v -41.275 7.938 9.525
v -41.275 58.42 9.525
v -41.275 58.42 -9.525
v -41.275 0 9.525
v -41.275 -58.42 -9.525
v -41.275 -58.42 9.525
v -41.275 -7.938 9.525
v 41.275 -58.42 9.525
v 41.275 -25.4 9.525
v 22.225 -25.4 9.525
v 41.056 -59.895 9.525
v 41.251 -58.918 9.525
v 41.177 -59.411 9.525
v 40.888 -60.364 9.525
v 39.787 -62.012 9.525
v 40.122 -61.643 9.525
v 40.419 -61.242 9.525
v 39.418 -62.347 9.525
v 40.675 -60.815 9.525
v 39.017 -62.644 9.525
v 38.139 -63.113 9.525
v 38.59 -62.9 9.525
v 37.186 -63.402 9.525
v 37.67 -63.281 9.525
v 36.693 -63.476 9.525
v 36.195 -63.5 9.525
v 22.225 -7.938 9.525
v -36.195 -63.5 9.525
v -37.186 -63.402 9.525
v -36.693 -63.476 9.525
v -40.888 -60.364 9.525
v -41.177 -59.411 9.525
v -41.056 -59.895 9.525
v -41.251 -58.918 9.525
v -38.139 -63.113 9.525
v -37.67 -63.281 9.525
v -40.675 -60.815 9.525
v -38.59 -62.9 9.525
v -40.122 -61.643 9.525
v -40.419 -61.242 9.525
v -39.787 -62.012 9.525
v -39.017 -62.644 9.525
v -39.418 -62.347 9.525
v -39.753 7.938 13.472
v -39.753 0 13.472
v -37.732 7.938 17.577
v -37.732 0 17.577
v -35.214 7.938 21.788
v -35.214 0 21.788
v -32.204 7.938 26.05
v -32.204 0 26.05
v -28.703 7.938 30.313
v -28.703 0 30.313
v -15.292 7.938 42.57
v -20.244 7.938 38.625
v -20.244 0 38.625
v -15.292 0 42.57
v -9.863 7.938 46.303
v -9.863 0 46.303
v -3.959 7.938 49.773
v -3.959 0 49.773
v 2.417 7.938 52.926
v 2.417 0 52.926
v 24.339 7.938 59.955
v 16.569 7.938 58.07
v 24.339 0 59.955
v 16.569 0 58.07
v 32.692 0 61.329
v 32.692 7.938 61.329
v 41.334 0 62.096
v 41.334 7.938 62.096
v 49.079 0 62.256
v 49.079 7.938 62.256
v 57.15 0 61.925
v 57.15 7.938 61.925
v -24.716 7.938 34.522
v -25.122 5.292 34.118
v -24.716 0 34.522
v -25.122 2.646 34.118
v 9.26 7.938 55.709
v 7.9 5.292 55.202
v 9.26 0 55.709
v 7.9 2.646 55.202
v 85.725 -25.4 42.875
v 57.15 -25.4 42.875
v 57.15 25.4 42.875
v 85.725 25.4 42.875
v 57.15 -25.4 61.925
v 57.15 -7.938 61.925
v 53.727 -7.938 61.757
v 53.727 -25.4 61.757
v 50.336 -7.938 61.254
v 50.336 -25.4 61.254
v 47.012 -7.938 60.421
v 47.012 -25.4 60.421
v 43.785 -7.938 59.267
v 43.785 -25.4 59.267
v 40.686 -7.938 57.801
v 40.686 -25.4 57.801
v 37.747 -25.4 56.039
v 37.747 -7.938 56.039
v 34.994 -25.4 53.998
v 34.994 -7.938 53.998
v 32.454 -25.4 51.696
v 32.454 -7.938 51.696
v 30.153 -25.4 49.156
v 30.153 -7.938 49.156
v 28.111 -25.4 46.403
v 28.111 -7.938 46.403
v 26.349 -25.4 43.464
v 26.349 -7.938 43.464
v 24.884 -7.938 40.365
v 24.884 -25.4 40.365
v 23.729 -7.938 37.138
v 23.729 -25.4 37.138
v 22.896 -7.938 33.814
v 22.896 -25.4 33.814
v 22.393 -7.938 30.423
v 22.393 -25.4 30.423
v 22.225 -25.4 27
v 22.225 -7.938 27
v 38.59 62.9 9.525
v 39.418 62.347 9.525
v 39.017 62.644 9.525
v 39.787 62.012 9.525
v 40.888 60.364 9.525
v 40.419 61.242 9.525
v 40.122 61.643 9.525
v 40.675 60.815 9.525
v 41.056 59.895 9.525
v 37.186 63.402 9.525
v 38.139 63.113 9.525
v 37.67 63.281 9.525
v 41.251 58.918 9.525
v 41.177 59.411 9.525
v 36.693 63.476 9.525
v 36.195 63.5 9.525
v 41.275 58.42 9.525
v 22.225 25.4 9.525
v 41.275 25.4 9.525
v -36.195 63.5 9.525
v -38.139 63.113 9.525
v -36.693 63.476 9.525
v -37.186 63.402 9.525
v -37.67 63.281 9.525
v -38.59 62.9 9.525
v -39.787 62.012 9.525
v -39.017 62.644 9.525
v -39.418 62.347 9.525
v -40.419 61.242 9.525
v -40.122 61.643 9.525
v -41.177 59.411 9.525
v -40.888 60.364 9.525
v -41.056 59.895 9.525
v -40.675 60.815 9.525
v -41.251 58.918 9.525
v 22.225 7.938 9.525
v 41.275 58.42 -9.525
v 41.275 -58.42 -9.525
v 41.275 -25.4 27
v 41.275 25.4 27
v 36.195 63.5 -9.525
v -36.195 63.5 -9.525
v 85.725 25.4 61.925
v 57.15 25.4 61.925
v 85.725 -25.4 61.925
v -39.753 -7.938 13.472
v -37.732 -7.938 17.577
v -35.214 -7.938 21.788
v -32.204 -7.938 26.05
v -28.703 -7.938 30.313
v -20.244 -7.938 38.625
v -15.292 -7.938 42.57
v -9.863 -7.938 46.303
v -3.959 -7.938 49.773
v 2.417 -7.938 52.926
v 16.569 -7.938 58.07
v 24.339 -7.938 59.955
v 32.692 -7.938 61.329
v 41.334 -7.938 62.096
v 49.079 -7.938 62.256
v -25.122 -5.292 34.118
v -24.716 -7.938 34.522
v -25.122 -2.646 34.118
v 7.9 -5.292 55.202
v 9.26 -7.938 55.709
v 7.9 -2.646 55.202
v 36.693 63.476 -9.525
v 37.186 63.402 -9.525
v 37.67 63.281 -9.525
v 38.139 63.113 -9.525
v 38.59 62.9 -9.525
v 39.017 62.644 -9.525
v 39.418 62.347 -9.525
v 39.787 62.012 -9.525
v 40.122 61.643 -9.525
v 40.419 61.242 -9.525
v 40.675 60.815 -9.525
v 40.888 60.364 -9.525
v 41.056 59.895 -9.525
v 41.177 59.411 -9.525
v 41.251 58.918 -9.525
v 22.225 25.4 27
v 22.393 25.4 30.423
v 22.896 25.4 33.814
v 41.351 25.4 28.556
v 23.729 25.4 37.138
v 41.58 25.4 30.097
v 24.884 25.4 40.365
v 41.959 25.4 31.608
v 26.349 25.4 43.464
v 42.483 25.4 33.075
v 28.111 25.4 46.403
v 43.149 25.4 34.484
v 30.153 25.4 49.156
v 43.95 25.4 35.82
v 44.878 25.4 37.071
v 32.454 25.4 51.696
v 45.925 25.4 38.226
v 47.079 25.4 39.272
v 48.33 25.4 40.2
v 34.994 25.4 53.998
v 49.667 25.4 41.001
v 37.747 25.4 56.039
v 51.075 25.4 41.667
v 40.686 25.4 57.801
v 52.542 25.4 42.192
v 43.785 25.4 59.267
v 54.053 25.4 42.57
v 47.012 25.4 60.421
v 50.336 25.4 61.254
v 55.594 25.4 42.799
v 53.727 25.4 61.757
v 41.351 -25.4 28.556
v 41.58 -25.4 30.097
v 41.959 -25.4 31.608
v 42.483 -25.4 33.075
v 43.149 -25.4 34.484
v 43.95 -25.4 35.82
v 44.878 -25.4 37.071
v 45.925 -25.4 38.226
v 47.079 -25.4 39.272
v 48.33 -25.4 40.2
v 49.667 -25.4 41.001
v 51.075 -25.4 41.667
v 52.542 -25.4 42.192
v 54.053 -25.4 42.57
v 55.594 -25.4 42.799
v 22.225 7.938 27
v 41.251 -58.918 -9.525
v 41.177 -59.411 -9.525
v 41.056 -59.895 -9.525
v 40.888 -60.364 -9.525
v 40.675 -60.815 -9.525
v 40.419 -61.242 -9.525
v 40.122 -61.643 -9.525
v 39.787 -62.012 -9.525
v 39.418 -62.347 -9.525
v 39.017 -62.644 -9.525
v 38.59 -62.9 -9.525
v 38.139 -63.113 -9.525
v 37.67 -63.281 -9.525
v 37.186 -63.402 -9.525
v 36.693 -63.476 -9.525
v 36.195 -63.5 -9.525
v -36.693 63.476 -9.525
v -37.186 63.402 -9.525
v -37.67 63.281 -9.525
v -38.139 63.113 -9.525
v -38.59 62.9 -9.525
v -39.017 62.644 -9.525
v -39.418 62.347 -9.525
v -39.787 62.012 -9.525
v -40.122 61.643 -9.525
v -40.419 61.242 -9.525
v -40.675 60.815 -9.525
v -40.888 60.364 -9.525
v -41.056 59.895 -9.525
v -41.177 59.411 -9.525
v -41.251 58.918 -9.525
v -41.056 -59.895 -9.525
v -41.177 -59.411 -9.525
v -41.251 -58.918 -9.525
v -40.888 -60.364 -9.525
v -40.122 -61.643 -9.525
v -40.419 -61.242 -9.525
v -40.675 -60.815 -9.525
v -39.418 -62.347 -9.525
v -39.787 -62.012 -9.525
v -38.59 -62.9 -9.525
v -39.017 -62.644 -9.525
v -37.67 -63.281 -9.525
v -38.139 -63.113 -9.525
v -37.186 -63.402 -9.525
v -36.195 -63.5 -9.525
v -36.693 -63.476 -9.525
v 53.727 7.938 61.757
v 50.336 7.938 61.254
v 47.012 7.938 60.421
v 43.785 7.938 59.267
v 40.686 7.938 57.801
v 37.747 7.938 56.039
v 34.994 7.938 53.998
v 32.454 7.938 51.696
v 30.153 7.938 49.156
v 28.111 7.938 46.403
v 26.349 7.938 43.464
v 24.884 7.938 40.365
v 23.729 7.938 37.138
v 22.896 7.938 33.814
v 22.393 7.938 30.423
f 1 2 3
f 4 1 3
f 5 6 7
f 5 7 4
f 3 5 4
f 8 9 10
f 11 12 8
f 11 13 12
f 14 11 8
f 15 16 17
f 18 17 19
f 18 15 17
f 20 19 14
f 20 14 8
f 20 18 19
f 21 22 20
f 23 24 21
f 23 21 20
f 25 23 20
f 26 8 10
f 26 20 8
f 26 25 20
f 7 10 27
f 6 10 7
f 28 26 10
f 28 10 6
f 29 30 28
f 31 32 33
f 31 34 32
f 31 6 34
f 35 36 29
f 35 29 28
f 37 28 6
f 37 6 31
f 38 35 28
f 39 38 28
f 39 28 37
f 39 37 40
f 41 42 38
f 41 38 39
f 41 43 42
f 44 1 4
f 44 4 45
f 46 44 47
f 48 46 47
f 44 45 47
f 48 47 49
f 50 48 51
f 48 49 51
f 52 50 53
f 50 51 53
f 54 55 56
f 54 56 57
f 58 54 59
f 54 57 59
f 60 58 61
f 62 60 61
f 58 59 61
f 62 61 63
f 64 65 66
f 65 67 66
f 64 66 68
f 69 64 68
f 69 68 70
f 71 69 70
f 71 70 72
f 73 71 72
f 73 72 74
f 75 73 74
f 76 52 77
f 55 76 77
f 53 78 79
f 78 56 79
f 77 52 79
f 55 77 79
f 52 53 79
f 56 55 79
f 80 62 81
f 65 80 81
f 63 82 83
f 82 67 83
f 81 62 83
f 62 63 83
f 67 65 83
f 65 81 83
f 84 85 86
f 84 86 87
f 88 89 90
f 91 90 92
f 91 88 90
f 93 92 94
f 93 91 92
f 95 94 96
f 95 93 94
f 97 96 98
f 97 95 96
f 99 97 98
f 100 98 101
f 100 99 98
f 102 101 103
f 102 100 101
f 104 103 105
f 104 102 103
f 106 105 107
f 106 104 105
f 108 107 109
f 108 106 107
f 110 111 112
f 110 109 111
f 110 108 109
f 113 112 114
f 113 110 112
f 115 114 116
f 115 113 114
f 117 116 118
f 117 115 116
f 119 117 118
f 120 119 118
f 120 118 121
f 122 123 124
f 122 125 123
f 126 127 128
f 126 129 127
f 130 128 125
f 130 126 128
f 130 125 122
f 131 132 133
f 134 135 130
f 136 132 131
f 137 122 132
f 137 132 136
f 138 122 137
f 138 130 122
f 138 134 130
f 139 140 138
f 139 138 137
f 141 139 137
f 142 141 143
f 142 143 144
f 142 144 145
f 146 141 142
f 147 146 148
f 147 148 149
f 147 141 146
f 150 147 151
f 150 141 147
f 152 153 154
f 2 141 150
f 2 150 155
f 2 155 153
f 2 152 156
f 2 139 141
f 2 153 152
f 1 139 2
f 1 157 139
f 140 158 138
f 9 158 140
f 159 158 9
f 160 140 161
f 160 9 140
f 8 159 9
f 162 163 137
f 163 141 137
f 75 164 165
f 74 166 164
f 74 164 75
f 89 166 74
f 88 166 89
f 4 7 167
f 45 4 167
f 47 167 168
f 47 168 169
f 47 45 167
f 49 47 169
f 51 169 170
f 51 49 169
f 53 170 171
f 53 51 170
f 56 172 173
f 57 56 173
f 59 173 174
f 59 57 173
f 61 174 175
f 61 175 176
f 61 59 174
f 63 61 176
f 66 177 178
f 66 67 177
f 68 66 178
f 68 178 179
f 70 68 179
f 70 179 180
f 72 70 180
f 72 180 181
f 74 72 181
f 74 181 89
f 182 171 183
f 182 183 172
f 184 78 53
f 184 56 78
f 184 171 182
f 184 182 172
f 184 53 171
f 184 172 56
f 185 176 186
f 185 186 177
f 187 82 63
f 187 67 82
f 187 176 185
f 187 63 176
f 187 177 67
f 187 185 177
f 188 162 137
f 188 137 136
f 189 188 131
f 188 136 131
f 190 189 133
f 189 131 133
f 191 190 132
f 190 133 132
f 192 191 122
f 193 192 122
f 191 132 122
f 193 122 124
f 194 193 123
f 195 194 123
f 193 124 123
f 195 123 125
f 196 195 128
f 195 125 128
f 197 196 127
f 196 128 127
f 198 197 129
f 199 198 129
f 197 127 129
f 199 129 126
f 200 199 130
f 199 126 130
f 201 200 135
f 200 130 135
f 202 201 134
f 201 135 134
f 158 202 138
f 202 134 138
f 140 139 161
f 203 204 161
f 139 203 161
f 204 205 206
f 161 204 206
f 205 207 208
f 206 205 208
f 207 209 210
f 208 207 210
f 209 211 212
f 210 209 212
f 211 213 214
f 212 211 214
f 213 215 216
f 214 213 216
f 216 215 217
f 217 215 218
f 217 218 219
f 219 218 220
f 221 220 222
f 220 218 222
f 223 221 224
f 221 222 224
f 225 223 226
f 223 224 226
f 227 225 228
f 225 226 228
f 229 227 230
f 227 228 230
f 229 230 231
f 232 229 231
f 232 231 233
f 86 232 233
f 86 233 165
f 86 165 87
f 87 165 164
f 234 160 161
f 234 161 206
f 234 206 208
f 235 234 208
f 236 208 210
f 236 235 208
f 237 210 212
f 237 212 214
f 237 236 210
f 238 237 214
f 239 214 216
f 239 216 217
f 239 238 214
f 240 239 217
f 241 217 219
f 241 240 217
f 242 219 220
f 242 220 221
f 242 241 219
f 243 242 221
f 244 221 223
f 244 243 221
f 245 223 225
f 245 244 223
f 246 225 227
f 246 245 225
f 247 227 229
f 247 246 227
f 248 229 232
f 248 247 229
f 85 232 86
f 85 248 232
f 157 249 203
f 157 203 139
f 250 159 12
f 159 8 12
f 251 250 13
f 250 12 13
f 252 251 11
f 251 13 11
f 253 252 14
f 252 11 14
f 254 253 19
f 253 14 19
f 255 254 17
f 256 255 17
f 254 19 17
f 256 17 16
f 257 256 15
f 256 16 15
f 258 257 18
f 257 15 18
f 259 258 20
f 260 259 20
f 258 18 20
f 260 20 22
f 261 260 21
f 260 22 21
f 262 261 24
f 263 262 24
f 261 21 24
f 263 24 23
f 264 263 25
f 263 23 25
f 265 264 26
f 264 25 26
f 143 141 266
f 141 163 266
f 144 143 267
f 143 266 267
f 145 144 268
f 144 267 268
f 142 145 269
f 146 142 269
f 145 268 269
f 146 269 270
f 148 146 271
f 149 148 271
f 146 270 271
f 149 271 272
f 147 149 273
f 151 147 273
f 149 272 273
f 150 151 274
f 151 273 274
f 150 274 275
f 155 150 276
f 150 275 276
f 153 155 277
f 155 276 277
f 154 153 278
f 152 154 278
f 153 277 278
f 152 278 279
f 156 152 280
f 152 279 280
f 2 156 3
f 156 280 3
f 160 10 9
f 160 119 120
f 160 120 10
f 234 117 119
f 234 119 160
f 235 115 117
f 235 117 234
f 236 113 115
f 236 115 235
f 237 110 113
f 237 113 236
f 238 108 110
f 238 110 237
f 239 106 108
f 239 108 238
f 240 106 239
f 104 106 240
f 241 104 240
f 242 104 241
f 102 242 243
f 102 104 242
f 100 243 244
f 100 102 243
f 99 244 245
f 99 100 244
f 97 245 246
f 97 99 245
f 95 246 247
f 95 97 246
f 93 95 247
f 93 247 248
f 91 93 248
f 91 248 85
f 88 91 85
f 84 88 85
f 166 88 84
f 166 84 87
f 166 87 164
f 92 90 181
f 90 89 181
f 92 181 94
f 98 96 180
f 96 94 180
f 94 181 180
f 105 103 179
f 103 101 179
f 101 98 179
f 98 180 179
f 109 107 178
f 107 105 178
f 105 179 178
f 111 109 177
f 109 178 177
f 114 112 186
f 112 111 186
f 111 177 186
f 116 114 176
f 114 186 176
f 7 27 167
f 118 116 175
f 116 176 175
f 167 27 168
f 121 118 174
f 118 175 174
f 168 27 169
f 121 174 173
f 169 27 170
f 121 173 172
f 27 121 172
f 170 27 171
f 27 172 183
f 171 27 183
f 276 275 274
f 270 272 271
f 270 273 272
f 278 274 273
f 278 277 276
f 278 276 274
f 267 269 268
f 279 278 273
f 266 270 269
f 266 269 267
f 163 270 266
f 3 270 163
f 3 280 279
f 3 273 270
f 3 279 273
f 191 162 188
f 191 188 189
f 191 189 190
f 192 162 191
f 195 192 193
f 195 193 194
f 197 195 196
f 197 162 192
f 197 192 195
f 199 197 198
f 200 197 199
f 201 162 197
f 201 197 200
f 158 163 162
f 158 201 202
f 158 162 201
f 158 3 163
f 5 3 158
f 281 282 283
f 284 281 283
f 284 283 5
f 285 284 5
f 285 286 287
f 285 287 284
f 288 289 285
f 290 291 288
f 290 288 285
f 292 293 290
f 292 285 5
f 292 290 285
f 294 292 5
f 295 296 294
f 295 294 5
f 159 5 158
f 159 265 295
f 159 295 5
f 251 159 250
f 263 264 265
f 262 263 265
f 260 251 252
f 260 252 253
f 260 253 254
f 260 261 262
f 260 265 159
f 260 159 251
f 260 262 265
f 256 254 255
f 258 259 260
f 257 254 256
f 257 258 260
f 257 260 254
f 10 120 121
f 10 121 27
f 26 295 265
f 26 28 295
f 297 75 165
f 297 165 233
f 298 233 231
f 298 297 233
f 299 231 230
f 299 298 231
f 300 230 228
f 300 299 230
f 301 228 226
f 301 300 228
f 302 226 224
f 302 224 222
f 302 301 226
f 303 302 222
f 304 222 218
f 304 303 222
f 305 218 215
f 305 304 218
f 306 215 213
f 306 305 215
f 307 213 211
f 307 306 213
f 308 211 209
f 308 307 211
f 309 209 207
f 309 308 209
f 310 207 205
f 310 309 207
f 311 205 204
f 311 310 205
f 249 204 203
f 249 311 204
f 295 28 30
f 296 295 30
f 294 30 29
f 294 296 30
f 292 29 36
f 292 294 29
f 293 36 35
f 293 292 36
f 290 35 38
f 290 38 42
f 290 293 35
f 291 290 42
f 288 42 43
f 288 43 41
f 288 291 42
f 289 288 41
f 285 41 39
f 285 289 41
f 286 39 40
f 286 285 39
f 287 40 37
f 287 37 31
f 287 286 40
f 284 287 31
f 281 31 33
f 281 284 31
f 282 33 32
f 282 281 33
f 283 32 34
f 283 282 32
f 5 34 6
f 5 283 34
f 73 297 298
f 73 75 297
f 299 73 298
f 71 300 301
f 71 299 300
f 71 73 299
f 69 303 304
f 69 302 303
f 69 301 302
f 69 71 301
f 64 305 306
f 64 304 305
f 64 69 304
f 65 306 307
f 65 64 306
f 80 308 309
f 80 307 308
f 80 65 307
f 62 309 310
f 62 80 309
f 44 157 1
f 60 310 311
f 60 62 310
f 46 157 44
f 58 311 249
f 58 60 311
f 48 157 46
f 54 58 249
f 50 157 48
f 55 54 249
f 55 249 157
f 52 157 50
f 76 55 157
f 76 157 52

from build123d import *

# Parameters (mm, degrees)
F1_DEPTH = 63.5
F0_W     = 25.4
F0_H     = 19.05
F2_DEPTH = 25.4
F3_DEPTH = 7.9375
F4_R     = 5.08


with BuildPart() as f1:
    # F0 (on Front) → F1 (new body, symmetric)
    with BuildSketch(Plane.XZ):
        Polygon((-41.275, -9.525), (41.275, -9.525), (41.275, 9.525), (22.225, 9.525), (-41.275, 9.525), align=None)
    extrude(amount=F1_DEPTH, both=True)

    # F0 (on Front) → F2 (join, symmetric)
    with BuildSketch(Plane.XZ):
        with BuildLine():
            Line((22.225, 9.525), (41.275, 9.525))
            Line((41.275, 9.525), (41.275, 27.0002))
            ThreePointArc((41.275, 27.0002), (45.9246798487, 38.2255201513), (57.15, 42.8752))
            Line((57.15, 42.8752), (60.325, 42.8752))
            Line((60.325, 42.8752), (60.325, 61.9252))
            Line((60.325, 61.9252), (57.15, 61.9252))
            ThreePointArc((57.15, 61.9252), (32.4542956671, 51.6959043329), (22.225, 27.0002))
            Line((22.225, 27.0002), (22.225, 9.525))
        make_face()
        with Locations((73.025, 52.4002)):
            Rectangle(F0_W, F0_H)
    extrude(amount=F2_DEPTH, both=True)

    # F0 (on Front) → F3 (join, symmetric)
    with BuildSketch(Plane.XZ):
        with BuildLine():
            add(Edge.make_bspline(
                [(-41.275, 9.525), (-33.7711833417, 32.2572402656), (0, 65.9977197647), (57.15, 61.9252)],
                knots=[0, 0, 0, 0, 111.5045361635, 111.5045361635, 111.5045361635, 111.5045361635], degree=3))
            Line((-41.275, 9.525), (22.225, 9.525))
            Line((22.225, 9.525), (22.225, 27.0002))
            ThreePointArc((22.225, 27.0002), (32.4542956671, 51.6959043329), (57.15, 61.9252))
        make_face()
    extrude(amount=F3_DEPTH, both=True)

    # F4
    f4_edges = [f1.edges().sort_by_distance(p)[0] for p in [
        (41.275, -63.5, 0),
        (41.275, 63.5, 0),
        (-41.275, 63.5, 0),
        (-41.275, -63.5, 0),
    ]]
    fillet(f4_edges, radius=F4_R)


solid = f1.part
